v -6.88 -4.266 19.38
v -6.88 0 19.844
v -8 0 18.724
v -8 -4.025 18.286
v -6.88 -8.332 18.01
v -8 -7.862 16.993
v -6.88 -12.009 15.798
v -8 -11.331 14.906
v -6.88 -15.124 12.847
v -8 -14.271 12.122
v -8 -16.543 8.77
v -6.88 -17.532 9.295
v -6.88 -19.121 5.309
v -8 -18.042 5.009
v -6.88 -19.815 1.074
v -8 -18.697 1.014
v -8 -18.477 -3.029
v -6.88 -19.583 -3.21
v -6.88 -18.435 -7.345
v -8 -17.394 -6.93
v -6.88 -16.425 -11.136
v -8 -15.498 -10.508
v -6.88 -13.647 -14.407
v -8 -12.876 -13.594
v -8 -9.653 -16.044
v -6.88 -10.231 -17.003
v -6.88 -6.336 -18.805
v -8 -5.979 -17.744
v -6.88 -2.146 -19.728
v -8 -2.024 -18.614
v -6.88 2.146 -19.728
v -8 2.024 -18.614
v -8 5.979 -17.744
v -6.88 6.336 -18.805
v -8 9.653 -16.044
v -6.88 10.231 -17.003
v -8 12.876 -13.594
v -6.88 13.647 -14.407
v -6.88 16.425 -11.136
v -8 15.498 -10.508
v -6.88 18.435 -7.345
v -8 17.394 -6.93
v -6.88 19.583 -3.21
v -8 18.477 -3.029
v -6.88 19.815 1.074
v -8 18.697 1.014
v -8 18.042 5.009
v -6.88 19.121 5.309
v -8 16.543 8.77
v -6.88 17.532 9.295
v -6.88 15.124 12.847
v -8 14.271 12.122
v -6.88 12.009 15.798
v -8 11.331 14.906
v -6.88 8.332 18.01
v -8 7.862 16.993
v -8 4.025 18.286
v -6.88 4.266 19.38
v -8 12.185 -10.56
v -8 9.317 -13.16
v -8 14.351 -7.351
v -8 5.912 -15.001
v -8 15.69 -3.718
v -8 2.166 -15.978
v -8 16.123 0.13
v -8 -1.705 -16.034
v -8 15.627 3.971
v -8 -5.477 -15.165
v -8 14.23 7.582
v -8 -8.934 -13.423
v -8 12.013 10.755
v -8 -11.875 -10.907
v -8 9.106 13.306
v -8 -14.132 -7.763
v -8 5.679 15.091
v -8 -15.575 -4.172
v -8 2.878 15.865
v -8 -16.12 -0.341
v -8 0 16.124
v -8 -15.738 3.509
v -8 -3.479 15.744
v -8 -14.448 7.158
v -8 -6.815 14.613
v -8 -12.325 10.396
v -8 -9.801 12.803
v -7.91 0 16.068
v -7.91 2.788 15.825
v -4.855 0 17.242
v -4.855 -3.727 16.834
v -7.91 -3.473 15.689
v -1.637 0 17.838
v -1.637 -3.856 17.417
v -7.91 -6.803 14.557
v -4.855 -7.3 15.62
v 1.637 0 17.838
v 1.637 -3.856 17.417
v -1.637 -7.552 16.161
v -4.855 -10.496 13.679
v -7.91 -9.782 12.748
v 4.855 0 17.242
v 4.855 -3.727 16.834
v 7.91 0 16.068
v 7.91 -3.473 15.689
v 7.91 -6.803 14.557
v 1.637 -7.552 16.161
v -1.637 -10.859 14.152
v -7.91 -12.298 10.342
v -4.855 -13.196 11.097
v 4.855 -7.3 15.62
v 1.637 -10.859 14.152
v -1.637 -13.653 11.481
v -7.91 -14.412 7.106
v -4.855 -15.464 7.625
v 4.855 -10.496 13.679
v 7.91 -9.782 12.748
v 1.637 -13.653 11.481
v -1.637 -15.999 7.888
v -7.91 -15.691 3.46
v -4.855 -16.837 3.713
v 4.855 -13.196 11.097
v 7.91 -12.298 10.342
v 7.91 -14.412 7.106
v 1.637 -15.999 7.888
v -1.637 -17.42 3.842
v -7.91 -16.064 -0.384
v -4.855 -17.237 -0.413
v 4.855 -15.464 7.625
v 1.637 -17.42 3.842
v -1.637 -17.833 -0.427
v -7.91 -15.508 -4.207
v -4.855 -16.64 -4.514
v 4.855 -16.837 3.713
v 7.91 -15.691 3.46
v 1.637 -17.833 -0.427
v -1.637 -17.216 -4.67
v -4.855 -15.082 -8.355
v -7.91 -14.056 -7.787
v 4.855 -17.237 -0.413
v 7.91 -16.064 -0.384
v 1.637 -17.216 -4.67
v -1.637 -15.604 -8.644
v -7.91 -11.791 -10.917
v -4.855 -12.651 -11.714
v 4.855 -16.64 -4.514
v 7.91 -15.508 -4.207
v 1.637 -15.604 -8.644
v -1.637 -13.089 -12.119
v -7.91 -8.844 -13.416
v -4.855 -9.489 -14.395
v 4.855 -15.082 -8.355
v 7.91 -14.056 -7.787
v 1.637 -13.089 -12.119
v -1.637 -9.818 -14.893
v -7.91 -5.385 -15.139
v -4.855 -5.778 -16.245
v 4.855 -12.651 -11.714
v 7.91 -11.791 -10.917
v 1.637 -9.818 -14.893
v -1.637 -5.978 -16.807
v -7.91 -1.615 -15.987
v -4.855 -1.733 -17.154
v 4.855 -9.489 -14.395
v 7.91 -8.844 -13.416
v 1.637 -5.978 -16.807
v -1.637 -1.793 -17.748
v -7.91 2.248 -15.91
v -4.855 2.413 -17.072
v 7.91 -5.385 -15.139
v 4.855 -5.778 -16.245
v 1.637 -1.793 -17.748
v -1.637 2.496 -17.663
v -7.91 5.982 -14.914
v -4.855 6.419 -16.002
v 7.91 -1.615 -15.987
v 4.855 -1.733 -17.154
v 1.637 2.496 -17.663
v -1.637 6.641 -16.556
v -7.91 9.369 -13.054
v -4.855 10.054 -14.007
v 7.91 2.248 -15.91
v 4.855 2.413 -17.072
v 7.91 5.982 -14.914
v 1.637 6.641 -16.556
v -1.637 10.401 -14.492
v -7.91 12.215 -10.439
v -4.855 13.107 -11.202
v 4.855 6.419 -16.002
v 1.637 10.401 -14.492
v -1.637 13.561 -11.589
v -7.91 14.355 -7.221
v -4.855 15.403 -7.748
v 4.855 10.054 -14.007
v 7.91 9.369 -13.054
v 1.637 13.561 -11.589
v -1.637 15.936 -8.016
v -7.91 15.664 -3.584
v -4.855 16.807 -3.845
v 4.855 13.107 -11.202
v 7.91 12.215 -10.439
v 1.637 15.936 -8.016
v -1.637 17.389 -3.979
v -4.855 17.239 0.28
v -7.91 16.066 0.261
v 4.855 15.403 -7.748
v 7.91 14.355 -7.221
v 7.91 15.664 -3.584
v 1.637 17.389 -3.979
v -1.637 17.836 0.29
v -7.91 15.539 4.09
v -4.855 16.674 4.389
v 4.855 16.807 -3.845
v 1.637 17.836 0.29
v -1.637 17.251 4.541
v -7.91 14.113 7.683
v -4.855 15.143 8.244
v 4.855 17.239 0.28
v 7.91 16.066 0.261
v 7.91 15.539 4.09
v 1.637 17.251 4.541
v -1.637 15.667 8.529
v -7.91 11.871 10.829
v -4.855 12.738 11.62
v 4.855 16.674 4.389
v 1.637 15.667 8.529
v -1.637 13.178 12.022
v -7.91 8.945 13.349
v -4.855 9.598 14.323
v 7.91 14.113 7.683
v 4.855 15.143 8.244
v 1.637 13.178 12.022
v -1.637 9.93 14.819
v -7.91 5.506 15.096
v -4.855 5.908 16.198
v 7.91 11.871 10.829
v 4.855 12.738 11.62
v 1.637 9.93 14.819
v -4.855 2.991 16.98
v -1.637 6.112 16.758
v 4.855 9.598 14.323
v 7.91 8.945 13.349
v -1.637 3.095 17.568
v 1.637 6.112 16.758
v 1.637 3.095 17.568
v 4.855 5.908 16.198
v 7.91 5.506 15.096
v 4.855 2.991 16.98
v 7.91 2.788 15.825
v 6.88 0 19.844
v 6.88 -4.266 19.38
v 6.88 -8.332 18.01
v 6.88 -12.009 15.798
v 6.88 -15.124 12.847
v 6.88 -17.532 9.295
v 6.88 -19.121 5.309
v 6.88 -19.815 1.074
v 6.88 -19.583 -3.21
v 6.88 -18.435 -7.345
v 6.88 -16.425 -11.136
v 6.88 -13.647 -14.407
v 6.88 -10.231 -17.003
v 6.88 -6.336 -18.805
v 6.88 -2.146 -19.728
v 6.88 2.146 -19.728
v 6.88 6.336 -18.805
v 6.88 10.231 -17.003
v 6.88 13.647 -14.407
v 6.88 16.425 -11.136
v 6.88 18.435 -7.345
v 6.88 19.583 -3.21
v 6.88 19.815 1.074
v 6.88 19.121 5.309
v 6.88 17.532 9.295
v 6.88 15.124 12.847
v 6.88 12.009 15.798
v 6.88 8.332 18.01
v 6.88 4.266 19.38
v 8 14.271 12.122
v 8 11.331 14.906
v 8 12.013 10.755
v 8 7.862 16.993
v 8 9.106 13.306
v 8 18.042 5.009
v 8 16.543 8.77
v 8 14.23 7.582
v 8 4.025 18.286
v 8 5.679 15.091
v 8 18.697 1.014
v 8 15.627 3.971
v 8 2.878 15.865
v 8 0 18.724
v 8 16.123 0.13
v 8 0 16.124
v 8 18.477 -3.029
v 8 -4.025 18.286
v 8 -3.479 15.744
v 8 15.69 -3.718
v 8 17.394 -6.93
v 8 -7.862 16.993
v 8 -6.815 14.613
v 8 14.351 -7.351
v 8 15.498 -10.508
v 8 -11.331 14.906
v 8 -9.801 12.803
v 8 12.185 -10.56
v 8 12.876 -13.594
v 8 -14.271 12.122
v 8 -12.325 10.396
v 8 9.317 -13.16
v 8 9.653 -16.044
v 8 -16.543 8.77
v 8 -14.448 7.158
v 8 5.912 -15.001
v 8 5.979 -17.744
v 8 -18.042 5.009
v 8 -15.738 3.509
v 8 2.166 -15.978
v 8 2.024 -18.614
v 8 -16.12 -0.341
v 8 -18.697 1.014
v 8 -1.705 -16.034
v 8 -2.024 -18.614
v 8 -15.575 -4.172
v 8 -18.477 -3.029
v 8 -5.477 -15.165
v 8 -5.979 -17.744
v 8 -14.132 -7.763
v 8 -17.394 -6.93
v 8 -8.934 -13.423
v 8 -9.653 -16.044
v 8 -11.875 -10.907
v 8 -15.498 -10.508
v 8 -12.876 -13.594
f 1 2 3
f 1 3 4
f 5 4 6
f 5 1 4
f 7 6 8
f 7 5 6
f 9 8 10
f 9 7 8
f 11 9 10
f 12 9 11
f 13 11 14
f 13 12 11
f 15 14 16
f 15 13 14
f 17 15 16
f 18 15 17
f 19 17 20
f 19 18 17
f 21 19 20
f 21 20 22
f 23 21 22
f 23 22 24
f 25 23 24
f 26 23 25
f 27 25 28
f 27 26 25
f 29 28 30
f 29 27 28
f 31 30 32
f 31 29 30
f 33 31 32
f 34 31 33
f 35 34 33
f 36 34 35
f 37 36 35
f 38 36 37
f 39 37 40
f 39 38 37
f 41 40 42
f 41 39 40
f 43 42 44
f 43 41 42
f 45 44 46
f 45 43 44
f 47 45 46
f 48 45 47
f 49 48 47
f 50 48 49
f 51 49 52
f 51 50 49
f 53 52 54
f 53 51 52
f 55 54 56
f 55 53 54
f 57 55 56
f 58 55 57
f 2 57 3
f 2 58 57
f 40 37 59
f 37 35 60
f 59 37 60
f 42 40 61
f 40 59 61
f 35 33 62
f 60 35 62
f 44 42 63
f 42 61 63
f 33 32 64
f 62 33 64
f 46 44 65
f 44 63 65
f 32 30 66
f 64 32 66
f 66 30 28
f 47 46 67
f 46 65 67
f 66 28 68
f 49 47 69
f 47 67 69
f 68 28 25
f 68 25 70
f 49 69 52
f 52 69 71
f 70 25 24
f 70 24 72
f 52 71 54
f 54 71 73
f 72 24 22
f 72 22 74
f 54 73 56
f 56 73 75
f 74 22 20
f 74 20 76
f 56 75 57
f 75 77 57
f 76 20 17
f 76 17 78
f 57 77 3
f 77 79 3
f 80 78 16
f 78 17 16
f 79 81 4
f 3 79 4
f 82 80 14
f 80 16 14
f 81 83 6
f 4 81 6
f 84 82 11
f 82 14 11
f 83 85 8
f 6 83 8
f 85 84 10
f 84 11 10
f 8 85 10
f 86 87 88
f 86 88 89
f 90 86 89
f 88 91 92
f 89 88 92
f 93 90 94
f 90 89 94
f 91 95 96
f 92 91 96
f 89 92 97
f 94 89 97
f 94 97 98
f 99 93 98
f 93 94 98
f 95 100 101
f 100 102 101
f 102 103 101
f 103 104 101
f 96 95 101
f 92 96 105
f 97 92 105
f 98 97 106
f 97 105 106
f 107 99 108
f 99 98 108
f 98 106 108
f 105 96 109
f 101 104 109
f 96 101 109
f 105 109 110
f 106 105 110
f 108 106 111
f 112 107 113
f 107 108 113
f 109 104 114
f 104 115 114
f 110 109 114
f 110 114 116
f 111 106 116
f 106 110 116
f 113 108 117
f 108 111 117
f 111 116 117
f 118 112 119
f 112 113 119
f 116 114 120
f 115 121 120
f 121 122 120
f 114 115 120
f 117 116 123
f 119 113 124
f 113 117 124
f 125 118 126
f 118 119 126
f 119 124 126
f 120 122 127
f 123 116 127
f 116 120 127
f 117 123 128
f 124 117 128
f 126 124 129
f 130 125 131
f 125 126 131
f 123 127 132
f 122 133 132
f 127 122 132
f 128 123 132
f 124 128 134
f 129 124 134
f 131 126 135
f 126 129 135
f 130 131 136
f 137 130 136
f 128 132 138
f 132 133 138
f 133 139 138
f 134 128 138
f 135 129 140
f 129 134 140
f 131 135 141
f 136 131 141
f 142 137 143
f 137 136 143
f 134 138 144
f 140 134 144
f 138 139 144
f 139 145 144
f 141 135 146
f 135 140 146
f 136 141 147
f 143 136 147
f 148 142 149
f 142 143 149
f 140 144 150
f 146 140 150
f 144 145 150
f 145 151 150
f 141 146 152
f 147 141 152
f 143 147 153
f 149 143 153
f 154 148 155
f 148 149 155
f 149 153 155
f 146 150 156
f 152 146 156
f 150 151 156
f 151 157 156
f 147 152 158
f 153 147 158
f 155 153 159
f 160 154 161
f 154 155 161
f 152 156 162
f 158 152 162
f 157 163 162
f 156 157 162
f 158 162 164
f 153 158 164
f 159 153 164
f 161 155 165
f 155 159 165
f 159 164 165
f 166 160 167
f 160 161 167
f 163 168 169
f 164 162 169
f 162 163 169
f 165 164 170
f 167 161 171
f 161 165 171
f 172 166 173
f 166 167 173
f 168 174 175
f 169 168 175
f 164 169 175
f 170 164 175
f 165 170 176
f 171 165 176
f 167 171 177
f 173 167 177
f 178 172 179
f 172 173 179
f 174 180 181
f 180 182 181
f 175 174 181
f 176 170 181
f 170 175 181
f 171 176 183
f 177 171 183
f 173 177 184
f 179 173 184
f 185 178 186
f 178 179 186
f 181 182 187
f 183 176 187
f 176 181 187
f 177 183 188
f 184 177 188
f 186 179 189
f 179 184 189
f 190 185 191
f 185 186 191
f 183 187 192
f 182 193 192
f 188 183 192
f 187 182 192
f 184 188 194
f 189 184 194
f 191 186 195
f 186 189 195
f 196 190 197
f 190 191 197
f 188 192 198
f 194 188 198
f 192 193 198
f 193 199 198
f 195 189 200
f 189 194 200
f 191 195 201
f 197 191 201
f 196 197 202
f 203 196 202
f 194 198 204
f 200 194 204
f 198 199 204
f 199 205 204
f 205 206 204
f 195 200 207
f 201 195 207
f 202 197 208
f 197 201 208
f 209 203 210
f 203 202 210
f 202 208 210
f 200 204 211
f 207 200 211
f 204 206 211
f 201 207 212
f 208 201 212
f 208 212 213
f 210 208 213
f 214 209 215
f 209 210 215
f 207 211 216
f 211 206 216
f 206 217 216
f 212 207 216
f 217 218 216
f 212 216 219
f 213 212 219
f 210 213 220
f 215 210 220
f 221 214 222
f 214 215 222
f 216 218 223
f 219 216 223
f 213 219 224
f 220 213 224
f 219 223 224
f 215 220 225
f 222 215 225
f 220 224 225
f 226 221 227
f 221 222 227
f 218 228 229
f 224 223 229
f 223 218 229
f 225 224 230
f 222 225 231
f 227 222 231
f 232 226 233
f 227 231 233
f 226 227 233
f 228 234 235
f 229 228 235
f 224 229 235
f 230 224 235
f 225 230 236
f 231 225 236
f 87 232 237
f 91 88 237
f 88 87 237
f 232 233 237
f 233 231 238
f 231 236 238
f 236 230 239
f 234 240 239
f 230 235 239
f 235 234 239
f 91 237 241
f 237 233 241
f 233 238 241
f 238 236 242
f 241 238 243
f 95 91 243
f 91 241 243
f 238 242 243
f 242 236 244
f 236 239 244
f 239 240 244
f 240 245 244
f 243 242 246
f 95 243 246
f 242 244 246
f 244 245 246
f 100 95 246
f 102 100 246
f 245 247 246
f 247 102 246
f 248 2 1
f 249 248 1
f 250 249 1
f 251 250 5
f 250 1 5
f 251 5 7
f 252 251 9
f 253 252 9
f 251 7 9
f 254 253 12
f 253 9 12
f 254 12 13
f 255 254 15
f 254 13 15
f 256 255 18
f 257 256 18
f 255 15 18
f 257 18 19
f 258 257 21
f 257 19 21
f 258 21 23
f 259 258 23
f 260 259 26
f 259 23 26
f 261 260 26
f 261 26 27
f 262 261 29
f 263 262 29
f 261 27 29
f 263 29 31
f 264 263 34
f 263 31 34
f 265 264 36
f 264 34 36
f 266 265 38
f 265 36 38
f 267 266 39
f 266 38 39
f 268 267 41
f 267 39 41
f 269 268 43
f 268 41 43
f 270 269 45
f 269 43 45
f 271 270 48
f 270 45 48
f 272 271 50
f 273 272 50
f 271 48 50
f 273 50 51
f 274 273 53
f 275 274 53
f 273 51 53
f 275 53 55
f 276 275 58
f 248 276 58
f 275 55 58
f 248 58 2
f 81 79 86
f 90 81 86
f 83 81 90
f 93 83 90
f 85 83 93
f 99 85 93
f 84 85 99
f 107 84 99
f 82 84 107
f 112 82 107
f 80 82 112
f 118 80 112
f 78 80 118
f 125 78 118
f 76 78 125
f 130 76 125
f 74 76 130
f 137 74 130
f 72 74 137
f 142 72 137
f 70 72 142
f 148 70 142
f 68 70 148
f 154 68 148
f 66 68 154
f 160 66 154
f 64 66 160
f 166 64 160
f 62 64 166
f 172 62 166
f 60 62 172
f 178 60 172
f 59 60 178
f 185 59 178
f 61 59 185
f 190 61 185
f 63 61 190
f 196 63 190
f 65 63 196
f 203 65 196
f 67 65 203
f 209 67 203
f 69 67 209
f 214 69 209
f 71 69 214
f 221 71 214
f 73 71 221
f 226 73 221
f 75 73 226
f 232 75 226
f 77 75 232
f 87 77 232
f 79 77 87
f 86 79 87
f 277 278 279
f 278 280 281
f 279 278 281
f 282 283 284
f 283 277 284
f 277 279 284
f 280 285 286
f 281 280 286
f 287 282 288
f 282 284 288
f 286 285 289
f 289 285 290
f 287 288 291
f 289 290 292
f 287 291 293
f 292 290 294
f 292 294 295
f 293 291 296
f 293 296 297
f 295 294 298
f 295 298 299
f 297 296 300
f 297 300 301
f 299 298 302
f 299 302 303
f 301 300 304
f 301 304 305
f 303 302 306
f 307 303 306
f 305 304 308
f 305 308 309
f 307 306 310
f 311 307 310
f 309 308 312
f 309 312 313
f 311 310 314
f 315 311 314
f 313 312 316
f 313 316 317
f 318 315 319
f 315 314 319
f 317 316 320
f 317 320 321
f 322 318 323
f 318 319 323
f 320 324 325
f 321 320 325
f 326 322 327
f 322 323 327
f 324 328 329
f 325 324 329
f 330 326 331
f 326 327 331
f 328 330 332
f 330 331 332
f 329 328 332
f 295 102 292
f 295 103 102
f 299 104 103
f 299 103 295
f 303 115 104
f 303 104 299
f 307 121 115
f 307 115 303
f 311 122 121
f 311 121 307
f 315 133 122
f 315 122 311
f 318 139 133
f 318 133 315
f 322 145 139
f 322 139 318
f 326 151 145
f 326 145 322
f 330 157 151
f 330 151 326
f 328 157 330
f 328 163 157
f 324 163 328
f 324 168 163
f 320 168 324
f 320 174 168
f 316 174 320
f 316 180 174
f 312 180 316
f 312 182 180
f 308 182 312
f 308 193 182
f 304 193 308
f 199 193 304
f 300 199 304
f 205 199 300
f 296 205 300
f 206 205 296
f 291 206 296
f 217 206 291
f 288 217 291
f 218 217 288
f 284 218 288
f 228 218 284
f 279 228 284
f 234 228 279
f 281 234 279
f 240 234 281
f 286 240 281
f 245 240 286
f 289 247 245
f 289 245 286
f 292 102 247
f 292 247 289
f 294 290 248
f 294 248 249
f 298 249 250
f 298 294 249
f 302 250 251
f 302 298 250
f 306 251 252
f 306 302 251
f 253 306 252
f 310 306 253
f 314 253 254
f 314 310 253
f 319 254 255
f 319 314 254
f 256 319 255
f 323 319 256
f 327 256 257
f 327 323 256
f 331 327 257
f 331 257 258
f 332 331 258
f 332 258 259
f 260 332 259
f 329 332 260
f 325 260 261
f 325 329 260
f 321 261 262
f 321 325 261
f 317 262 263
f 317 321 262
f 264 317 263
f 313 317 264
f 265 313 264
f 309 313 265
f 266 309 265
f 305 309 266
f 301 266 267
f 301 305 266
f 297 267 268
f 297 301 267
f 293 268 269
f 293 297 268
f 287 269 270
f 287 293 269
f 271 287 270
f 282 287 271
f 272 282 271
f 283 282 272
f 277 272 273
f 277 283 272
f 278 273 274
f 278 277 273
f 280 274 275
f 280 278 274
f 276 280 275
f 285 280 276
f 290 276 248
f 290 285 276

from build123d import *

# Parameters (mm, degrees)
F3_SIZE = 0.1
F4_SIZE = 1.12


with BuildPart() as f2:
    # F0 (on Front) → F2 (revolve)
    with BuildSketch(Plane.XZ):
        with BuildLine():
            Line((8, 19.844), (-8, 19.844))
            Line((-8, 19.844), (-8, 16.024))
            ThreePointArc((-8, 16.024), (0, 17.91324), (8, 16.024))
            Line((8, 16.024), (8, 19.844))
        make_face()
    revolve(axis=Axis((0.055771, 0, 0), (1, 0, 0)))

    # F3
    f3_edges = [f2.edges().sort_by_distance(p)[0] for p in [
        (8, 0, -16.024),
        (-8, 0, -16.024),
    ]]
    chamfer(f3_edges, length=F3_SIZE)

    # F4
    f4_edges = [f2.edges().sort_by_distance(p)[0] for p in [
        (-8, 0, -19.844),
        (8, 0, -19.844),
    ]]
    chamfer(f4_edges, length=F4_SIZE)


solid = f2.part
